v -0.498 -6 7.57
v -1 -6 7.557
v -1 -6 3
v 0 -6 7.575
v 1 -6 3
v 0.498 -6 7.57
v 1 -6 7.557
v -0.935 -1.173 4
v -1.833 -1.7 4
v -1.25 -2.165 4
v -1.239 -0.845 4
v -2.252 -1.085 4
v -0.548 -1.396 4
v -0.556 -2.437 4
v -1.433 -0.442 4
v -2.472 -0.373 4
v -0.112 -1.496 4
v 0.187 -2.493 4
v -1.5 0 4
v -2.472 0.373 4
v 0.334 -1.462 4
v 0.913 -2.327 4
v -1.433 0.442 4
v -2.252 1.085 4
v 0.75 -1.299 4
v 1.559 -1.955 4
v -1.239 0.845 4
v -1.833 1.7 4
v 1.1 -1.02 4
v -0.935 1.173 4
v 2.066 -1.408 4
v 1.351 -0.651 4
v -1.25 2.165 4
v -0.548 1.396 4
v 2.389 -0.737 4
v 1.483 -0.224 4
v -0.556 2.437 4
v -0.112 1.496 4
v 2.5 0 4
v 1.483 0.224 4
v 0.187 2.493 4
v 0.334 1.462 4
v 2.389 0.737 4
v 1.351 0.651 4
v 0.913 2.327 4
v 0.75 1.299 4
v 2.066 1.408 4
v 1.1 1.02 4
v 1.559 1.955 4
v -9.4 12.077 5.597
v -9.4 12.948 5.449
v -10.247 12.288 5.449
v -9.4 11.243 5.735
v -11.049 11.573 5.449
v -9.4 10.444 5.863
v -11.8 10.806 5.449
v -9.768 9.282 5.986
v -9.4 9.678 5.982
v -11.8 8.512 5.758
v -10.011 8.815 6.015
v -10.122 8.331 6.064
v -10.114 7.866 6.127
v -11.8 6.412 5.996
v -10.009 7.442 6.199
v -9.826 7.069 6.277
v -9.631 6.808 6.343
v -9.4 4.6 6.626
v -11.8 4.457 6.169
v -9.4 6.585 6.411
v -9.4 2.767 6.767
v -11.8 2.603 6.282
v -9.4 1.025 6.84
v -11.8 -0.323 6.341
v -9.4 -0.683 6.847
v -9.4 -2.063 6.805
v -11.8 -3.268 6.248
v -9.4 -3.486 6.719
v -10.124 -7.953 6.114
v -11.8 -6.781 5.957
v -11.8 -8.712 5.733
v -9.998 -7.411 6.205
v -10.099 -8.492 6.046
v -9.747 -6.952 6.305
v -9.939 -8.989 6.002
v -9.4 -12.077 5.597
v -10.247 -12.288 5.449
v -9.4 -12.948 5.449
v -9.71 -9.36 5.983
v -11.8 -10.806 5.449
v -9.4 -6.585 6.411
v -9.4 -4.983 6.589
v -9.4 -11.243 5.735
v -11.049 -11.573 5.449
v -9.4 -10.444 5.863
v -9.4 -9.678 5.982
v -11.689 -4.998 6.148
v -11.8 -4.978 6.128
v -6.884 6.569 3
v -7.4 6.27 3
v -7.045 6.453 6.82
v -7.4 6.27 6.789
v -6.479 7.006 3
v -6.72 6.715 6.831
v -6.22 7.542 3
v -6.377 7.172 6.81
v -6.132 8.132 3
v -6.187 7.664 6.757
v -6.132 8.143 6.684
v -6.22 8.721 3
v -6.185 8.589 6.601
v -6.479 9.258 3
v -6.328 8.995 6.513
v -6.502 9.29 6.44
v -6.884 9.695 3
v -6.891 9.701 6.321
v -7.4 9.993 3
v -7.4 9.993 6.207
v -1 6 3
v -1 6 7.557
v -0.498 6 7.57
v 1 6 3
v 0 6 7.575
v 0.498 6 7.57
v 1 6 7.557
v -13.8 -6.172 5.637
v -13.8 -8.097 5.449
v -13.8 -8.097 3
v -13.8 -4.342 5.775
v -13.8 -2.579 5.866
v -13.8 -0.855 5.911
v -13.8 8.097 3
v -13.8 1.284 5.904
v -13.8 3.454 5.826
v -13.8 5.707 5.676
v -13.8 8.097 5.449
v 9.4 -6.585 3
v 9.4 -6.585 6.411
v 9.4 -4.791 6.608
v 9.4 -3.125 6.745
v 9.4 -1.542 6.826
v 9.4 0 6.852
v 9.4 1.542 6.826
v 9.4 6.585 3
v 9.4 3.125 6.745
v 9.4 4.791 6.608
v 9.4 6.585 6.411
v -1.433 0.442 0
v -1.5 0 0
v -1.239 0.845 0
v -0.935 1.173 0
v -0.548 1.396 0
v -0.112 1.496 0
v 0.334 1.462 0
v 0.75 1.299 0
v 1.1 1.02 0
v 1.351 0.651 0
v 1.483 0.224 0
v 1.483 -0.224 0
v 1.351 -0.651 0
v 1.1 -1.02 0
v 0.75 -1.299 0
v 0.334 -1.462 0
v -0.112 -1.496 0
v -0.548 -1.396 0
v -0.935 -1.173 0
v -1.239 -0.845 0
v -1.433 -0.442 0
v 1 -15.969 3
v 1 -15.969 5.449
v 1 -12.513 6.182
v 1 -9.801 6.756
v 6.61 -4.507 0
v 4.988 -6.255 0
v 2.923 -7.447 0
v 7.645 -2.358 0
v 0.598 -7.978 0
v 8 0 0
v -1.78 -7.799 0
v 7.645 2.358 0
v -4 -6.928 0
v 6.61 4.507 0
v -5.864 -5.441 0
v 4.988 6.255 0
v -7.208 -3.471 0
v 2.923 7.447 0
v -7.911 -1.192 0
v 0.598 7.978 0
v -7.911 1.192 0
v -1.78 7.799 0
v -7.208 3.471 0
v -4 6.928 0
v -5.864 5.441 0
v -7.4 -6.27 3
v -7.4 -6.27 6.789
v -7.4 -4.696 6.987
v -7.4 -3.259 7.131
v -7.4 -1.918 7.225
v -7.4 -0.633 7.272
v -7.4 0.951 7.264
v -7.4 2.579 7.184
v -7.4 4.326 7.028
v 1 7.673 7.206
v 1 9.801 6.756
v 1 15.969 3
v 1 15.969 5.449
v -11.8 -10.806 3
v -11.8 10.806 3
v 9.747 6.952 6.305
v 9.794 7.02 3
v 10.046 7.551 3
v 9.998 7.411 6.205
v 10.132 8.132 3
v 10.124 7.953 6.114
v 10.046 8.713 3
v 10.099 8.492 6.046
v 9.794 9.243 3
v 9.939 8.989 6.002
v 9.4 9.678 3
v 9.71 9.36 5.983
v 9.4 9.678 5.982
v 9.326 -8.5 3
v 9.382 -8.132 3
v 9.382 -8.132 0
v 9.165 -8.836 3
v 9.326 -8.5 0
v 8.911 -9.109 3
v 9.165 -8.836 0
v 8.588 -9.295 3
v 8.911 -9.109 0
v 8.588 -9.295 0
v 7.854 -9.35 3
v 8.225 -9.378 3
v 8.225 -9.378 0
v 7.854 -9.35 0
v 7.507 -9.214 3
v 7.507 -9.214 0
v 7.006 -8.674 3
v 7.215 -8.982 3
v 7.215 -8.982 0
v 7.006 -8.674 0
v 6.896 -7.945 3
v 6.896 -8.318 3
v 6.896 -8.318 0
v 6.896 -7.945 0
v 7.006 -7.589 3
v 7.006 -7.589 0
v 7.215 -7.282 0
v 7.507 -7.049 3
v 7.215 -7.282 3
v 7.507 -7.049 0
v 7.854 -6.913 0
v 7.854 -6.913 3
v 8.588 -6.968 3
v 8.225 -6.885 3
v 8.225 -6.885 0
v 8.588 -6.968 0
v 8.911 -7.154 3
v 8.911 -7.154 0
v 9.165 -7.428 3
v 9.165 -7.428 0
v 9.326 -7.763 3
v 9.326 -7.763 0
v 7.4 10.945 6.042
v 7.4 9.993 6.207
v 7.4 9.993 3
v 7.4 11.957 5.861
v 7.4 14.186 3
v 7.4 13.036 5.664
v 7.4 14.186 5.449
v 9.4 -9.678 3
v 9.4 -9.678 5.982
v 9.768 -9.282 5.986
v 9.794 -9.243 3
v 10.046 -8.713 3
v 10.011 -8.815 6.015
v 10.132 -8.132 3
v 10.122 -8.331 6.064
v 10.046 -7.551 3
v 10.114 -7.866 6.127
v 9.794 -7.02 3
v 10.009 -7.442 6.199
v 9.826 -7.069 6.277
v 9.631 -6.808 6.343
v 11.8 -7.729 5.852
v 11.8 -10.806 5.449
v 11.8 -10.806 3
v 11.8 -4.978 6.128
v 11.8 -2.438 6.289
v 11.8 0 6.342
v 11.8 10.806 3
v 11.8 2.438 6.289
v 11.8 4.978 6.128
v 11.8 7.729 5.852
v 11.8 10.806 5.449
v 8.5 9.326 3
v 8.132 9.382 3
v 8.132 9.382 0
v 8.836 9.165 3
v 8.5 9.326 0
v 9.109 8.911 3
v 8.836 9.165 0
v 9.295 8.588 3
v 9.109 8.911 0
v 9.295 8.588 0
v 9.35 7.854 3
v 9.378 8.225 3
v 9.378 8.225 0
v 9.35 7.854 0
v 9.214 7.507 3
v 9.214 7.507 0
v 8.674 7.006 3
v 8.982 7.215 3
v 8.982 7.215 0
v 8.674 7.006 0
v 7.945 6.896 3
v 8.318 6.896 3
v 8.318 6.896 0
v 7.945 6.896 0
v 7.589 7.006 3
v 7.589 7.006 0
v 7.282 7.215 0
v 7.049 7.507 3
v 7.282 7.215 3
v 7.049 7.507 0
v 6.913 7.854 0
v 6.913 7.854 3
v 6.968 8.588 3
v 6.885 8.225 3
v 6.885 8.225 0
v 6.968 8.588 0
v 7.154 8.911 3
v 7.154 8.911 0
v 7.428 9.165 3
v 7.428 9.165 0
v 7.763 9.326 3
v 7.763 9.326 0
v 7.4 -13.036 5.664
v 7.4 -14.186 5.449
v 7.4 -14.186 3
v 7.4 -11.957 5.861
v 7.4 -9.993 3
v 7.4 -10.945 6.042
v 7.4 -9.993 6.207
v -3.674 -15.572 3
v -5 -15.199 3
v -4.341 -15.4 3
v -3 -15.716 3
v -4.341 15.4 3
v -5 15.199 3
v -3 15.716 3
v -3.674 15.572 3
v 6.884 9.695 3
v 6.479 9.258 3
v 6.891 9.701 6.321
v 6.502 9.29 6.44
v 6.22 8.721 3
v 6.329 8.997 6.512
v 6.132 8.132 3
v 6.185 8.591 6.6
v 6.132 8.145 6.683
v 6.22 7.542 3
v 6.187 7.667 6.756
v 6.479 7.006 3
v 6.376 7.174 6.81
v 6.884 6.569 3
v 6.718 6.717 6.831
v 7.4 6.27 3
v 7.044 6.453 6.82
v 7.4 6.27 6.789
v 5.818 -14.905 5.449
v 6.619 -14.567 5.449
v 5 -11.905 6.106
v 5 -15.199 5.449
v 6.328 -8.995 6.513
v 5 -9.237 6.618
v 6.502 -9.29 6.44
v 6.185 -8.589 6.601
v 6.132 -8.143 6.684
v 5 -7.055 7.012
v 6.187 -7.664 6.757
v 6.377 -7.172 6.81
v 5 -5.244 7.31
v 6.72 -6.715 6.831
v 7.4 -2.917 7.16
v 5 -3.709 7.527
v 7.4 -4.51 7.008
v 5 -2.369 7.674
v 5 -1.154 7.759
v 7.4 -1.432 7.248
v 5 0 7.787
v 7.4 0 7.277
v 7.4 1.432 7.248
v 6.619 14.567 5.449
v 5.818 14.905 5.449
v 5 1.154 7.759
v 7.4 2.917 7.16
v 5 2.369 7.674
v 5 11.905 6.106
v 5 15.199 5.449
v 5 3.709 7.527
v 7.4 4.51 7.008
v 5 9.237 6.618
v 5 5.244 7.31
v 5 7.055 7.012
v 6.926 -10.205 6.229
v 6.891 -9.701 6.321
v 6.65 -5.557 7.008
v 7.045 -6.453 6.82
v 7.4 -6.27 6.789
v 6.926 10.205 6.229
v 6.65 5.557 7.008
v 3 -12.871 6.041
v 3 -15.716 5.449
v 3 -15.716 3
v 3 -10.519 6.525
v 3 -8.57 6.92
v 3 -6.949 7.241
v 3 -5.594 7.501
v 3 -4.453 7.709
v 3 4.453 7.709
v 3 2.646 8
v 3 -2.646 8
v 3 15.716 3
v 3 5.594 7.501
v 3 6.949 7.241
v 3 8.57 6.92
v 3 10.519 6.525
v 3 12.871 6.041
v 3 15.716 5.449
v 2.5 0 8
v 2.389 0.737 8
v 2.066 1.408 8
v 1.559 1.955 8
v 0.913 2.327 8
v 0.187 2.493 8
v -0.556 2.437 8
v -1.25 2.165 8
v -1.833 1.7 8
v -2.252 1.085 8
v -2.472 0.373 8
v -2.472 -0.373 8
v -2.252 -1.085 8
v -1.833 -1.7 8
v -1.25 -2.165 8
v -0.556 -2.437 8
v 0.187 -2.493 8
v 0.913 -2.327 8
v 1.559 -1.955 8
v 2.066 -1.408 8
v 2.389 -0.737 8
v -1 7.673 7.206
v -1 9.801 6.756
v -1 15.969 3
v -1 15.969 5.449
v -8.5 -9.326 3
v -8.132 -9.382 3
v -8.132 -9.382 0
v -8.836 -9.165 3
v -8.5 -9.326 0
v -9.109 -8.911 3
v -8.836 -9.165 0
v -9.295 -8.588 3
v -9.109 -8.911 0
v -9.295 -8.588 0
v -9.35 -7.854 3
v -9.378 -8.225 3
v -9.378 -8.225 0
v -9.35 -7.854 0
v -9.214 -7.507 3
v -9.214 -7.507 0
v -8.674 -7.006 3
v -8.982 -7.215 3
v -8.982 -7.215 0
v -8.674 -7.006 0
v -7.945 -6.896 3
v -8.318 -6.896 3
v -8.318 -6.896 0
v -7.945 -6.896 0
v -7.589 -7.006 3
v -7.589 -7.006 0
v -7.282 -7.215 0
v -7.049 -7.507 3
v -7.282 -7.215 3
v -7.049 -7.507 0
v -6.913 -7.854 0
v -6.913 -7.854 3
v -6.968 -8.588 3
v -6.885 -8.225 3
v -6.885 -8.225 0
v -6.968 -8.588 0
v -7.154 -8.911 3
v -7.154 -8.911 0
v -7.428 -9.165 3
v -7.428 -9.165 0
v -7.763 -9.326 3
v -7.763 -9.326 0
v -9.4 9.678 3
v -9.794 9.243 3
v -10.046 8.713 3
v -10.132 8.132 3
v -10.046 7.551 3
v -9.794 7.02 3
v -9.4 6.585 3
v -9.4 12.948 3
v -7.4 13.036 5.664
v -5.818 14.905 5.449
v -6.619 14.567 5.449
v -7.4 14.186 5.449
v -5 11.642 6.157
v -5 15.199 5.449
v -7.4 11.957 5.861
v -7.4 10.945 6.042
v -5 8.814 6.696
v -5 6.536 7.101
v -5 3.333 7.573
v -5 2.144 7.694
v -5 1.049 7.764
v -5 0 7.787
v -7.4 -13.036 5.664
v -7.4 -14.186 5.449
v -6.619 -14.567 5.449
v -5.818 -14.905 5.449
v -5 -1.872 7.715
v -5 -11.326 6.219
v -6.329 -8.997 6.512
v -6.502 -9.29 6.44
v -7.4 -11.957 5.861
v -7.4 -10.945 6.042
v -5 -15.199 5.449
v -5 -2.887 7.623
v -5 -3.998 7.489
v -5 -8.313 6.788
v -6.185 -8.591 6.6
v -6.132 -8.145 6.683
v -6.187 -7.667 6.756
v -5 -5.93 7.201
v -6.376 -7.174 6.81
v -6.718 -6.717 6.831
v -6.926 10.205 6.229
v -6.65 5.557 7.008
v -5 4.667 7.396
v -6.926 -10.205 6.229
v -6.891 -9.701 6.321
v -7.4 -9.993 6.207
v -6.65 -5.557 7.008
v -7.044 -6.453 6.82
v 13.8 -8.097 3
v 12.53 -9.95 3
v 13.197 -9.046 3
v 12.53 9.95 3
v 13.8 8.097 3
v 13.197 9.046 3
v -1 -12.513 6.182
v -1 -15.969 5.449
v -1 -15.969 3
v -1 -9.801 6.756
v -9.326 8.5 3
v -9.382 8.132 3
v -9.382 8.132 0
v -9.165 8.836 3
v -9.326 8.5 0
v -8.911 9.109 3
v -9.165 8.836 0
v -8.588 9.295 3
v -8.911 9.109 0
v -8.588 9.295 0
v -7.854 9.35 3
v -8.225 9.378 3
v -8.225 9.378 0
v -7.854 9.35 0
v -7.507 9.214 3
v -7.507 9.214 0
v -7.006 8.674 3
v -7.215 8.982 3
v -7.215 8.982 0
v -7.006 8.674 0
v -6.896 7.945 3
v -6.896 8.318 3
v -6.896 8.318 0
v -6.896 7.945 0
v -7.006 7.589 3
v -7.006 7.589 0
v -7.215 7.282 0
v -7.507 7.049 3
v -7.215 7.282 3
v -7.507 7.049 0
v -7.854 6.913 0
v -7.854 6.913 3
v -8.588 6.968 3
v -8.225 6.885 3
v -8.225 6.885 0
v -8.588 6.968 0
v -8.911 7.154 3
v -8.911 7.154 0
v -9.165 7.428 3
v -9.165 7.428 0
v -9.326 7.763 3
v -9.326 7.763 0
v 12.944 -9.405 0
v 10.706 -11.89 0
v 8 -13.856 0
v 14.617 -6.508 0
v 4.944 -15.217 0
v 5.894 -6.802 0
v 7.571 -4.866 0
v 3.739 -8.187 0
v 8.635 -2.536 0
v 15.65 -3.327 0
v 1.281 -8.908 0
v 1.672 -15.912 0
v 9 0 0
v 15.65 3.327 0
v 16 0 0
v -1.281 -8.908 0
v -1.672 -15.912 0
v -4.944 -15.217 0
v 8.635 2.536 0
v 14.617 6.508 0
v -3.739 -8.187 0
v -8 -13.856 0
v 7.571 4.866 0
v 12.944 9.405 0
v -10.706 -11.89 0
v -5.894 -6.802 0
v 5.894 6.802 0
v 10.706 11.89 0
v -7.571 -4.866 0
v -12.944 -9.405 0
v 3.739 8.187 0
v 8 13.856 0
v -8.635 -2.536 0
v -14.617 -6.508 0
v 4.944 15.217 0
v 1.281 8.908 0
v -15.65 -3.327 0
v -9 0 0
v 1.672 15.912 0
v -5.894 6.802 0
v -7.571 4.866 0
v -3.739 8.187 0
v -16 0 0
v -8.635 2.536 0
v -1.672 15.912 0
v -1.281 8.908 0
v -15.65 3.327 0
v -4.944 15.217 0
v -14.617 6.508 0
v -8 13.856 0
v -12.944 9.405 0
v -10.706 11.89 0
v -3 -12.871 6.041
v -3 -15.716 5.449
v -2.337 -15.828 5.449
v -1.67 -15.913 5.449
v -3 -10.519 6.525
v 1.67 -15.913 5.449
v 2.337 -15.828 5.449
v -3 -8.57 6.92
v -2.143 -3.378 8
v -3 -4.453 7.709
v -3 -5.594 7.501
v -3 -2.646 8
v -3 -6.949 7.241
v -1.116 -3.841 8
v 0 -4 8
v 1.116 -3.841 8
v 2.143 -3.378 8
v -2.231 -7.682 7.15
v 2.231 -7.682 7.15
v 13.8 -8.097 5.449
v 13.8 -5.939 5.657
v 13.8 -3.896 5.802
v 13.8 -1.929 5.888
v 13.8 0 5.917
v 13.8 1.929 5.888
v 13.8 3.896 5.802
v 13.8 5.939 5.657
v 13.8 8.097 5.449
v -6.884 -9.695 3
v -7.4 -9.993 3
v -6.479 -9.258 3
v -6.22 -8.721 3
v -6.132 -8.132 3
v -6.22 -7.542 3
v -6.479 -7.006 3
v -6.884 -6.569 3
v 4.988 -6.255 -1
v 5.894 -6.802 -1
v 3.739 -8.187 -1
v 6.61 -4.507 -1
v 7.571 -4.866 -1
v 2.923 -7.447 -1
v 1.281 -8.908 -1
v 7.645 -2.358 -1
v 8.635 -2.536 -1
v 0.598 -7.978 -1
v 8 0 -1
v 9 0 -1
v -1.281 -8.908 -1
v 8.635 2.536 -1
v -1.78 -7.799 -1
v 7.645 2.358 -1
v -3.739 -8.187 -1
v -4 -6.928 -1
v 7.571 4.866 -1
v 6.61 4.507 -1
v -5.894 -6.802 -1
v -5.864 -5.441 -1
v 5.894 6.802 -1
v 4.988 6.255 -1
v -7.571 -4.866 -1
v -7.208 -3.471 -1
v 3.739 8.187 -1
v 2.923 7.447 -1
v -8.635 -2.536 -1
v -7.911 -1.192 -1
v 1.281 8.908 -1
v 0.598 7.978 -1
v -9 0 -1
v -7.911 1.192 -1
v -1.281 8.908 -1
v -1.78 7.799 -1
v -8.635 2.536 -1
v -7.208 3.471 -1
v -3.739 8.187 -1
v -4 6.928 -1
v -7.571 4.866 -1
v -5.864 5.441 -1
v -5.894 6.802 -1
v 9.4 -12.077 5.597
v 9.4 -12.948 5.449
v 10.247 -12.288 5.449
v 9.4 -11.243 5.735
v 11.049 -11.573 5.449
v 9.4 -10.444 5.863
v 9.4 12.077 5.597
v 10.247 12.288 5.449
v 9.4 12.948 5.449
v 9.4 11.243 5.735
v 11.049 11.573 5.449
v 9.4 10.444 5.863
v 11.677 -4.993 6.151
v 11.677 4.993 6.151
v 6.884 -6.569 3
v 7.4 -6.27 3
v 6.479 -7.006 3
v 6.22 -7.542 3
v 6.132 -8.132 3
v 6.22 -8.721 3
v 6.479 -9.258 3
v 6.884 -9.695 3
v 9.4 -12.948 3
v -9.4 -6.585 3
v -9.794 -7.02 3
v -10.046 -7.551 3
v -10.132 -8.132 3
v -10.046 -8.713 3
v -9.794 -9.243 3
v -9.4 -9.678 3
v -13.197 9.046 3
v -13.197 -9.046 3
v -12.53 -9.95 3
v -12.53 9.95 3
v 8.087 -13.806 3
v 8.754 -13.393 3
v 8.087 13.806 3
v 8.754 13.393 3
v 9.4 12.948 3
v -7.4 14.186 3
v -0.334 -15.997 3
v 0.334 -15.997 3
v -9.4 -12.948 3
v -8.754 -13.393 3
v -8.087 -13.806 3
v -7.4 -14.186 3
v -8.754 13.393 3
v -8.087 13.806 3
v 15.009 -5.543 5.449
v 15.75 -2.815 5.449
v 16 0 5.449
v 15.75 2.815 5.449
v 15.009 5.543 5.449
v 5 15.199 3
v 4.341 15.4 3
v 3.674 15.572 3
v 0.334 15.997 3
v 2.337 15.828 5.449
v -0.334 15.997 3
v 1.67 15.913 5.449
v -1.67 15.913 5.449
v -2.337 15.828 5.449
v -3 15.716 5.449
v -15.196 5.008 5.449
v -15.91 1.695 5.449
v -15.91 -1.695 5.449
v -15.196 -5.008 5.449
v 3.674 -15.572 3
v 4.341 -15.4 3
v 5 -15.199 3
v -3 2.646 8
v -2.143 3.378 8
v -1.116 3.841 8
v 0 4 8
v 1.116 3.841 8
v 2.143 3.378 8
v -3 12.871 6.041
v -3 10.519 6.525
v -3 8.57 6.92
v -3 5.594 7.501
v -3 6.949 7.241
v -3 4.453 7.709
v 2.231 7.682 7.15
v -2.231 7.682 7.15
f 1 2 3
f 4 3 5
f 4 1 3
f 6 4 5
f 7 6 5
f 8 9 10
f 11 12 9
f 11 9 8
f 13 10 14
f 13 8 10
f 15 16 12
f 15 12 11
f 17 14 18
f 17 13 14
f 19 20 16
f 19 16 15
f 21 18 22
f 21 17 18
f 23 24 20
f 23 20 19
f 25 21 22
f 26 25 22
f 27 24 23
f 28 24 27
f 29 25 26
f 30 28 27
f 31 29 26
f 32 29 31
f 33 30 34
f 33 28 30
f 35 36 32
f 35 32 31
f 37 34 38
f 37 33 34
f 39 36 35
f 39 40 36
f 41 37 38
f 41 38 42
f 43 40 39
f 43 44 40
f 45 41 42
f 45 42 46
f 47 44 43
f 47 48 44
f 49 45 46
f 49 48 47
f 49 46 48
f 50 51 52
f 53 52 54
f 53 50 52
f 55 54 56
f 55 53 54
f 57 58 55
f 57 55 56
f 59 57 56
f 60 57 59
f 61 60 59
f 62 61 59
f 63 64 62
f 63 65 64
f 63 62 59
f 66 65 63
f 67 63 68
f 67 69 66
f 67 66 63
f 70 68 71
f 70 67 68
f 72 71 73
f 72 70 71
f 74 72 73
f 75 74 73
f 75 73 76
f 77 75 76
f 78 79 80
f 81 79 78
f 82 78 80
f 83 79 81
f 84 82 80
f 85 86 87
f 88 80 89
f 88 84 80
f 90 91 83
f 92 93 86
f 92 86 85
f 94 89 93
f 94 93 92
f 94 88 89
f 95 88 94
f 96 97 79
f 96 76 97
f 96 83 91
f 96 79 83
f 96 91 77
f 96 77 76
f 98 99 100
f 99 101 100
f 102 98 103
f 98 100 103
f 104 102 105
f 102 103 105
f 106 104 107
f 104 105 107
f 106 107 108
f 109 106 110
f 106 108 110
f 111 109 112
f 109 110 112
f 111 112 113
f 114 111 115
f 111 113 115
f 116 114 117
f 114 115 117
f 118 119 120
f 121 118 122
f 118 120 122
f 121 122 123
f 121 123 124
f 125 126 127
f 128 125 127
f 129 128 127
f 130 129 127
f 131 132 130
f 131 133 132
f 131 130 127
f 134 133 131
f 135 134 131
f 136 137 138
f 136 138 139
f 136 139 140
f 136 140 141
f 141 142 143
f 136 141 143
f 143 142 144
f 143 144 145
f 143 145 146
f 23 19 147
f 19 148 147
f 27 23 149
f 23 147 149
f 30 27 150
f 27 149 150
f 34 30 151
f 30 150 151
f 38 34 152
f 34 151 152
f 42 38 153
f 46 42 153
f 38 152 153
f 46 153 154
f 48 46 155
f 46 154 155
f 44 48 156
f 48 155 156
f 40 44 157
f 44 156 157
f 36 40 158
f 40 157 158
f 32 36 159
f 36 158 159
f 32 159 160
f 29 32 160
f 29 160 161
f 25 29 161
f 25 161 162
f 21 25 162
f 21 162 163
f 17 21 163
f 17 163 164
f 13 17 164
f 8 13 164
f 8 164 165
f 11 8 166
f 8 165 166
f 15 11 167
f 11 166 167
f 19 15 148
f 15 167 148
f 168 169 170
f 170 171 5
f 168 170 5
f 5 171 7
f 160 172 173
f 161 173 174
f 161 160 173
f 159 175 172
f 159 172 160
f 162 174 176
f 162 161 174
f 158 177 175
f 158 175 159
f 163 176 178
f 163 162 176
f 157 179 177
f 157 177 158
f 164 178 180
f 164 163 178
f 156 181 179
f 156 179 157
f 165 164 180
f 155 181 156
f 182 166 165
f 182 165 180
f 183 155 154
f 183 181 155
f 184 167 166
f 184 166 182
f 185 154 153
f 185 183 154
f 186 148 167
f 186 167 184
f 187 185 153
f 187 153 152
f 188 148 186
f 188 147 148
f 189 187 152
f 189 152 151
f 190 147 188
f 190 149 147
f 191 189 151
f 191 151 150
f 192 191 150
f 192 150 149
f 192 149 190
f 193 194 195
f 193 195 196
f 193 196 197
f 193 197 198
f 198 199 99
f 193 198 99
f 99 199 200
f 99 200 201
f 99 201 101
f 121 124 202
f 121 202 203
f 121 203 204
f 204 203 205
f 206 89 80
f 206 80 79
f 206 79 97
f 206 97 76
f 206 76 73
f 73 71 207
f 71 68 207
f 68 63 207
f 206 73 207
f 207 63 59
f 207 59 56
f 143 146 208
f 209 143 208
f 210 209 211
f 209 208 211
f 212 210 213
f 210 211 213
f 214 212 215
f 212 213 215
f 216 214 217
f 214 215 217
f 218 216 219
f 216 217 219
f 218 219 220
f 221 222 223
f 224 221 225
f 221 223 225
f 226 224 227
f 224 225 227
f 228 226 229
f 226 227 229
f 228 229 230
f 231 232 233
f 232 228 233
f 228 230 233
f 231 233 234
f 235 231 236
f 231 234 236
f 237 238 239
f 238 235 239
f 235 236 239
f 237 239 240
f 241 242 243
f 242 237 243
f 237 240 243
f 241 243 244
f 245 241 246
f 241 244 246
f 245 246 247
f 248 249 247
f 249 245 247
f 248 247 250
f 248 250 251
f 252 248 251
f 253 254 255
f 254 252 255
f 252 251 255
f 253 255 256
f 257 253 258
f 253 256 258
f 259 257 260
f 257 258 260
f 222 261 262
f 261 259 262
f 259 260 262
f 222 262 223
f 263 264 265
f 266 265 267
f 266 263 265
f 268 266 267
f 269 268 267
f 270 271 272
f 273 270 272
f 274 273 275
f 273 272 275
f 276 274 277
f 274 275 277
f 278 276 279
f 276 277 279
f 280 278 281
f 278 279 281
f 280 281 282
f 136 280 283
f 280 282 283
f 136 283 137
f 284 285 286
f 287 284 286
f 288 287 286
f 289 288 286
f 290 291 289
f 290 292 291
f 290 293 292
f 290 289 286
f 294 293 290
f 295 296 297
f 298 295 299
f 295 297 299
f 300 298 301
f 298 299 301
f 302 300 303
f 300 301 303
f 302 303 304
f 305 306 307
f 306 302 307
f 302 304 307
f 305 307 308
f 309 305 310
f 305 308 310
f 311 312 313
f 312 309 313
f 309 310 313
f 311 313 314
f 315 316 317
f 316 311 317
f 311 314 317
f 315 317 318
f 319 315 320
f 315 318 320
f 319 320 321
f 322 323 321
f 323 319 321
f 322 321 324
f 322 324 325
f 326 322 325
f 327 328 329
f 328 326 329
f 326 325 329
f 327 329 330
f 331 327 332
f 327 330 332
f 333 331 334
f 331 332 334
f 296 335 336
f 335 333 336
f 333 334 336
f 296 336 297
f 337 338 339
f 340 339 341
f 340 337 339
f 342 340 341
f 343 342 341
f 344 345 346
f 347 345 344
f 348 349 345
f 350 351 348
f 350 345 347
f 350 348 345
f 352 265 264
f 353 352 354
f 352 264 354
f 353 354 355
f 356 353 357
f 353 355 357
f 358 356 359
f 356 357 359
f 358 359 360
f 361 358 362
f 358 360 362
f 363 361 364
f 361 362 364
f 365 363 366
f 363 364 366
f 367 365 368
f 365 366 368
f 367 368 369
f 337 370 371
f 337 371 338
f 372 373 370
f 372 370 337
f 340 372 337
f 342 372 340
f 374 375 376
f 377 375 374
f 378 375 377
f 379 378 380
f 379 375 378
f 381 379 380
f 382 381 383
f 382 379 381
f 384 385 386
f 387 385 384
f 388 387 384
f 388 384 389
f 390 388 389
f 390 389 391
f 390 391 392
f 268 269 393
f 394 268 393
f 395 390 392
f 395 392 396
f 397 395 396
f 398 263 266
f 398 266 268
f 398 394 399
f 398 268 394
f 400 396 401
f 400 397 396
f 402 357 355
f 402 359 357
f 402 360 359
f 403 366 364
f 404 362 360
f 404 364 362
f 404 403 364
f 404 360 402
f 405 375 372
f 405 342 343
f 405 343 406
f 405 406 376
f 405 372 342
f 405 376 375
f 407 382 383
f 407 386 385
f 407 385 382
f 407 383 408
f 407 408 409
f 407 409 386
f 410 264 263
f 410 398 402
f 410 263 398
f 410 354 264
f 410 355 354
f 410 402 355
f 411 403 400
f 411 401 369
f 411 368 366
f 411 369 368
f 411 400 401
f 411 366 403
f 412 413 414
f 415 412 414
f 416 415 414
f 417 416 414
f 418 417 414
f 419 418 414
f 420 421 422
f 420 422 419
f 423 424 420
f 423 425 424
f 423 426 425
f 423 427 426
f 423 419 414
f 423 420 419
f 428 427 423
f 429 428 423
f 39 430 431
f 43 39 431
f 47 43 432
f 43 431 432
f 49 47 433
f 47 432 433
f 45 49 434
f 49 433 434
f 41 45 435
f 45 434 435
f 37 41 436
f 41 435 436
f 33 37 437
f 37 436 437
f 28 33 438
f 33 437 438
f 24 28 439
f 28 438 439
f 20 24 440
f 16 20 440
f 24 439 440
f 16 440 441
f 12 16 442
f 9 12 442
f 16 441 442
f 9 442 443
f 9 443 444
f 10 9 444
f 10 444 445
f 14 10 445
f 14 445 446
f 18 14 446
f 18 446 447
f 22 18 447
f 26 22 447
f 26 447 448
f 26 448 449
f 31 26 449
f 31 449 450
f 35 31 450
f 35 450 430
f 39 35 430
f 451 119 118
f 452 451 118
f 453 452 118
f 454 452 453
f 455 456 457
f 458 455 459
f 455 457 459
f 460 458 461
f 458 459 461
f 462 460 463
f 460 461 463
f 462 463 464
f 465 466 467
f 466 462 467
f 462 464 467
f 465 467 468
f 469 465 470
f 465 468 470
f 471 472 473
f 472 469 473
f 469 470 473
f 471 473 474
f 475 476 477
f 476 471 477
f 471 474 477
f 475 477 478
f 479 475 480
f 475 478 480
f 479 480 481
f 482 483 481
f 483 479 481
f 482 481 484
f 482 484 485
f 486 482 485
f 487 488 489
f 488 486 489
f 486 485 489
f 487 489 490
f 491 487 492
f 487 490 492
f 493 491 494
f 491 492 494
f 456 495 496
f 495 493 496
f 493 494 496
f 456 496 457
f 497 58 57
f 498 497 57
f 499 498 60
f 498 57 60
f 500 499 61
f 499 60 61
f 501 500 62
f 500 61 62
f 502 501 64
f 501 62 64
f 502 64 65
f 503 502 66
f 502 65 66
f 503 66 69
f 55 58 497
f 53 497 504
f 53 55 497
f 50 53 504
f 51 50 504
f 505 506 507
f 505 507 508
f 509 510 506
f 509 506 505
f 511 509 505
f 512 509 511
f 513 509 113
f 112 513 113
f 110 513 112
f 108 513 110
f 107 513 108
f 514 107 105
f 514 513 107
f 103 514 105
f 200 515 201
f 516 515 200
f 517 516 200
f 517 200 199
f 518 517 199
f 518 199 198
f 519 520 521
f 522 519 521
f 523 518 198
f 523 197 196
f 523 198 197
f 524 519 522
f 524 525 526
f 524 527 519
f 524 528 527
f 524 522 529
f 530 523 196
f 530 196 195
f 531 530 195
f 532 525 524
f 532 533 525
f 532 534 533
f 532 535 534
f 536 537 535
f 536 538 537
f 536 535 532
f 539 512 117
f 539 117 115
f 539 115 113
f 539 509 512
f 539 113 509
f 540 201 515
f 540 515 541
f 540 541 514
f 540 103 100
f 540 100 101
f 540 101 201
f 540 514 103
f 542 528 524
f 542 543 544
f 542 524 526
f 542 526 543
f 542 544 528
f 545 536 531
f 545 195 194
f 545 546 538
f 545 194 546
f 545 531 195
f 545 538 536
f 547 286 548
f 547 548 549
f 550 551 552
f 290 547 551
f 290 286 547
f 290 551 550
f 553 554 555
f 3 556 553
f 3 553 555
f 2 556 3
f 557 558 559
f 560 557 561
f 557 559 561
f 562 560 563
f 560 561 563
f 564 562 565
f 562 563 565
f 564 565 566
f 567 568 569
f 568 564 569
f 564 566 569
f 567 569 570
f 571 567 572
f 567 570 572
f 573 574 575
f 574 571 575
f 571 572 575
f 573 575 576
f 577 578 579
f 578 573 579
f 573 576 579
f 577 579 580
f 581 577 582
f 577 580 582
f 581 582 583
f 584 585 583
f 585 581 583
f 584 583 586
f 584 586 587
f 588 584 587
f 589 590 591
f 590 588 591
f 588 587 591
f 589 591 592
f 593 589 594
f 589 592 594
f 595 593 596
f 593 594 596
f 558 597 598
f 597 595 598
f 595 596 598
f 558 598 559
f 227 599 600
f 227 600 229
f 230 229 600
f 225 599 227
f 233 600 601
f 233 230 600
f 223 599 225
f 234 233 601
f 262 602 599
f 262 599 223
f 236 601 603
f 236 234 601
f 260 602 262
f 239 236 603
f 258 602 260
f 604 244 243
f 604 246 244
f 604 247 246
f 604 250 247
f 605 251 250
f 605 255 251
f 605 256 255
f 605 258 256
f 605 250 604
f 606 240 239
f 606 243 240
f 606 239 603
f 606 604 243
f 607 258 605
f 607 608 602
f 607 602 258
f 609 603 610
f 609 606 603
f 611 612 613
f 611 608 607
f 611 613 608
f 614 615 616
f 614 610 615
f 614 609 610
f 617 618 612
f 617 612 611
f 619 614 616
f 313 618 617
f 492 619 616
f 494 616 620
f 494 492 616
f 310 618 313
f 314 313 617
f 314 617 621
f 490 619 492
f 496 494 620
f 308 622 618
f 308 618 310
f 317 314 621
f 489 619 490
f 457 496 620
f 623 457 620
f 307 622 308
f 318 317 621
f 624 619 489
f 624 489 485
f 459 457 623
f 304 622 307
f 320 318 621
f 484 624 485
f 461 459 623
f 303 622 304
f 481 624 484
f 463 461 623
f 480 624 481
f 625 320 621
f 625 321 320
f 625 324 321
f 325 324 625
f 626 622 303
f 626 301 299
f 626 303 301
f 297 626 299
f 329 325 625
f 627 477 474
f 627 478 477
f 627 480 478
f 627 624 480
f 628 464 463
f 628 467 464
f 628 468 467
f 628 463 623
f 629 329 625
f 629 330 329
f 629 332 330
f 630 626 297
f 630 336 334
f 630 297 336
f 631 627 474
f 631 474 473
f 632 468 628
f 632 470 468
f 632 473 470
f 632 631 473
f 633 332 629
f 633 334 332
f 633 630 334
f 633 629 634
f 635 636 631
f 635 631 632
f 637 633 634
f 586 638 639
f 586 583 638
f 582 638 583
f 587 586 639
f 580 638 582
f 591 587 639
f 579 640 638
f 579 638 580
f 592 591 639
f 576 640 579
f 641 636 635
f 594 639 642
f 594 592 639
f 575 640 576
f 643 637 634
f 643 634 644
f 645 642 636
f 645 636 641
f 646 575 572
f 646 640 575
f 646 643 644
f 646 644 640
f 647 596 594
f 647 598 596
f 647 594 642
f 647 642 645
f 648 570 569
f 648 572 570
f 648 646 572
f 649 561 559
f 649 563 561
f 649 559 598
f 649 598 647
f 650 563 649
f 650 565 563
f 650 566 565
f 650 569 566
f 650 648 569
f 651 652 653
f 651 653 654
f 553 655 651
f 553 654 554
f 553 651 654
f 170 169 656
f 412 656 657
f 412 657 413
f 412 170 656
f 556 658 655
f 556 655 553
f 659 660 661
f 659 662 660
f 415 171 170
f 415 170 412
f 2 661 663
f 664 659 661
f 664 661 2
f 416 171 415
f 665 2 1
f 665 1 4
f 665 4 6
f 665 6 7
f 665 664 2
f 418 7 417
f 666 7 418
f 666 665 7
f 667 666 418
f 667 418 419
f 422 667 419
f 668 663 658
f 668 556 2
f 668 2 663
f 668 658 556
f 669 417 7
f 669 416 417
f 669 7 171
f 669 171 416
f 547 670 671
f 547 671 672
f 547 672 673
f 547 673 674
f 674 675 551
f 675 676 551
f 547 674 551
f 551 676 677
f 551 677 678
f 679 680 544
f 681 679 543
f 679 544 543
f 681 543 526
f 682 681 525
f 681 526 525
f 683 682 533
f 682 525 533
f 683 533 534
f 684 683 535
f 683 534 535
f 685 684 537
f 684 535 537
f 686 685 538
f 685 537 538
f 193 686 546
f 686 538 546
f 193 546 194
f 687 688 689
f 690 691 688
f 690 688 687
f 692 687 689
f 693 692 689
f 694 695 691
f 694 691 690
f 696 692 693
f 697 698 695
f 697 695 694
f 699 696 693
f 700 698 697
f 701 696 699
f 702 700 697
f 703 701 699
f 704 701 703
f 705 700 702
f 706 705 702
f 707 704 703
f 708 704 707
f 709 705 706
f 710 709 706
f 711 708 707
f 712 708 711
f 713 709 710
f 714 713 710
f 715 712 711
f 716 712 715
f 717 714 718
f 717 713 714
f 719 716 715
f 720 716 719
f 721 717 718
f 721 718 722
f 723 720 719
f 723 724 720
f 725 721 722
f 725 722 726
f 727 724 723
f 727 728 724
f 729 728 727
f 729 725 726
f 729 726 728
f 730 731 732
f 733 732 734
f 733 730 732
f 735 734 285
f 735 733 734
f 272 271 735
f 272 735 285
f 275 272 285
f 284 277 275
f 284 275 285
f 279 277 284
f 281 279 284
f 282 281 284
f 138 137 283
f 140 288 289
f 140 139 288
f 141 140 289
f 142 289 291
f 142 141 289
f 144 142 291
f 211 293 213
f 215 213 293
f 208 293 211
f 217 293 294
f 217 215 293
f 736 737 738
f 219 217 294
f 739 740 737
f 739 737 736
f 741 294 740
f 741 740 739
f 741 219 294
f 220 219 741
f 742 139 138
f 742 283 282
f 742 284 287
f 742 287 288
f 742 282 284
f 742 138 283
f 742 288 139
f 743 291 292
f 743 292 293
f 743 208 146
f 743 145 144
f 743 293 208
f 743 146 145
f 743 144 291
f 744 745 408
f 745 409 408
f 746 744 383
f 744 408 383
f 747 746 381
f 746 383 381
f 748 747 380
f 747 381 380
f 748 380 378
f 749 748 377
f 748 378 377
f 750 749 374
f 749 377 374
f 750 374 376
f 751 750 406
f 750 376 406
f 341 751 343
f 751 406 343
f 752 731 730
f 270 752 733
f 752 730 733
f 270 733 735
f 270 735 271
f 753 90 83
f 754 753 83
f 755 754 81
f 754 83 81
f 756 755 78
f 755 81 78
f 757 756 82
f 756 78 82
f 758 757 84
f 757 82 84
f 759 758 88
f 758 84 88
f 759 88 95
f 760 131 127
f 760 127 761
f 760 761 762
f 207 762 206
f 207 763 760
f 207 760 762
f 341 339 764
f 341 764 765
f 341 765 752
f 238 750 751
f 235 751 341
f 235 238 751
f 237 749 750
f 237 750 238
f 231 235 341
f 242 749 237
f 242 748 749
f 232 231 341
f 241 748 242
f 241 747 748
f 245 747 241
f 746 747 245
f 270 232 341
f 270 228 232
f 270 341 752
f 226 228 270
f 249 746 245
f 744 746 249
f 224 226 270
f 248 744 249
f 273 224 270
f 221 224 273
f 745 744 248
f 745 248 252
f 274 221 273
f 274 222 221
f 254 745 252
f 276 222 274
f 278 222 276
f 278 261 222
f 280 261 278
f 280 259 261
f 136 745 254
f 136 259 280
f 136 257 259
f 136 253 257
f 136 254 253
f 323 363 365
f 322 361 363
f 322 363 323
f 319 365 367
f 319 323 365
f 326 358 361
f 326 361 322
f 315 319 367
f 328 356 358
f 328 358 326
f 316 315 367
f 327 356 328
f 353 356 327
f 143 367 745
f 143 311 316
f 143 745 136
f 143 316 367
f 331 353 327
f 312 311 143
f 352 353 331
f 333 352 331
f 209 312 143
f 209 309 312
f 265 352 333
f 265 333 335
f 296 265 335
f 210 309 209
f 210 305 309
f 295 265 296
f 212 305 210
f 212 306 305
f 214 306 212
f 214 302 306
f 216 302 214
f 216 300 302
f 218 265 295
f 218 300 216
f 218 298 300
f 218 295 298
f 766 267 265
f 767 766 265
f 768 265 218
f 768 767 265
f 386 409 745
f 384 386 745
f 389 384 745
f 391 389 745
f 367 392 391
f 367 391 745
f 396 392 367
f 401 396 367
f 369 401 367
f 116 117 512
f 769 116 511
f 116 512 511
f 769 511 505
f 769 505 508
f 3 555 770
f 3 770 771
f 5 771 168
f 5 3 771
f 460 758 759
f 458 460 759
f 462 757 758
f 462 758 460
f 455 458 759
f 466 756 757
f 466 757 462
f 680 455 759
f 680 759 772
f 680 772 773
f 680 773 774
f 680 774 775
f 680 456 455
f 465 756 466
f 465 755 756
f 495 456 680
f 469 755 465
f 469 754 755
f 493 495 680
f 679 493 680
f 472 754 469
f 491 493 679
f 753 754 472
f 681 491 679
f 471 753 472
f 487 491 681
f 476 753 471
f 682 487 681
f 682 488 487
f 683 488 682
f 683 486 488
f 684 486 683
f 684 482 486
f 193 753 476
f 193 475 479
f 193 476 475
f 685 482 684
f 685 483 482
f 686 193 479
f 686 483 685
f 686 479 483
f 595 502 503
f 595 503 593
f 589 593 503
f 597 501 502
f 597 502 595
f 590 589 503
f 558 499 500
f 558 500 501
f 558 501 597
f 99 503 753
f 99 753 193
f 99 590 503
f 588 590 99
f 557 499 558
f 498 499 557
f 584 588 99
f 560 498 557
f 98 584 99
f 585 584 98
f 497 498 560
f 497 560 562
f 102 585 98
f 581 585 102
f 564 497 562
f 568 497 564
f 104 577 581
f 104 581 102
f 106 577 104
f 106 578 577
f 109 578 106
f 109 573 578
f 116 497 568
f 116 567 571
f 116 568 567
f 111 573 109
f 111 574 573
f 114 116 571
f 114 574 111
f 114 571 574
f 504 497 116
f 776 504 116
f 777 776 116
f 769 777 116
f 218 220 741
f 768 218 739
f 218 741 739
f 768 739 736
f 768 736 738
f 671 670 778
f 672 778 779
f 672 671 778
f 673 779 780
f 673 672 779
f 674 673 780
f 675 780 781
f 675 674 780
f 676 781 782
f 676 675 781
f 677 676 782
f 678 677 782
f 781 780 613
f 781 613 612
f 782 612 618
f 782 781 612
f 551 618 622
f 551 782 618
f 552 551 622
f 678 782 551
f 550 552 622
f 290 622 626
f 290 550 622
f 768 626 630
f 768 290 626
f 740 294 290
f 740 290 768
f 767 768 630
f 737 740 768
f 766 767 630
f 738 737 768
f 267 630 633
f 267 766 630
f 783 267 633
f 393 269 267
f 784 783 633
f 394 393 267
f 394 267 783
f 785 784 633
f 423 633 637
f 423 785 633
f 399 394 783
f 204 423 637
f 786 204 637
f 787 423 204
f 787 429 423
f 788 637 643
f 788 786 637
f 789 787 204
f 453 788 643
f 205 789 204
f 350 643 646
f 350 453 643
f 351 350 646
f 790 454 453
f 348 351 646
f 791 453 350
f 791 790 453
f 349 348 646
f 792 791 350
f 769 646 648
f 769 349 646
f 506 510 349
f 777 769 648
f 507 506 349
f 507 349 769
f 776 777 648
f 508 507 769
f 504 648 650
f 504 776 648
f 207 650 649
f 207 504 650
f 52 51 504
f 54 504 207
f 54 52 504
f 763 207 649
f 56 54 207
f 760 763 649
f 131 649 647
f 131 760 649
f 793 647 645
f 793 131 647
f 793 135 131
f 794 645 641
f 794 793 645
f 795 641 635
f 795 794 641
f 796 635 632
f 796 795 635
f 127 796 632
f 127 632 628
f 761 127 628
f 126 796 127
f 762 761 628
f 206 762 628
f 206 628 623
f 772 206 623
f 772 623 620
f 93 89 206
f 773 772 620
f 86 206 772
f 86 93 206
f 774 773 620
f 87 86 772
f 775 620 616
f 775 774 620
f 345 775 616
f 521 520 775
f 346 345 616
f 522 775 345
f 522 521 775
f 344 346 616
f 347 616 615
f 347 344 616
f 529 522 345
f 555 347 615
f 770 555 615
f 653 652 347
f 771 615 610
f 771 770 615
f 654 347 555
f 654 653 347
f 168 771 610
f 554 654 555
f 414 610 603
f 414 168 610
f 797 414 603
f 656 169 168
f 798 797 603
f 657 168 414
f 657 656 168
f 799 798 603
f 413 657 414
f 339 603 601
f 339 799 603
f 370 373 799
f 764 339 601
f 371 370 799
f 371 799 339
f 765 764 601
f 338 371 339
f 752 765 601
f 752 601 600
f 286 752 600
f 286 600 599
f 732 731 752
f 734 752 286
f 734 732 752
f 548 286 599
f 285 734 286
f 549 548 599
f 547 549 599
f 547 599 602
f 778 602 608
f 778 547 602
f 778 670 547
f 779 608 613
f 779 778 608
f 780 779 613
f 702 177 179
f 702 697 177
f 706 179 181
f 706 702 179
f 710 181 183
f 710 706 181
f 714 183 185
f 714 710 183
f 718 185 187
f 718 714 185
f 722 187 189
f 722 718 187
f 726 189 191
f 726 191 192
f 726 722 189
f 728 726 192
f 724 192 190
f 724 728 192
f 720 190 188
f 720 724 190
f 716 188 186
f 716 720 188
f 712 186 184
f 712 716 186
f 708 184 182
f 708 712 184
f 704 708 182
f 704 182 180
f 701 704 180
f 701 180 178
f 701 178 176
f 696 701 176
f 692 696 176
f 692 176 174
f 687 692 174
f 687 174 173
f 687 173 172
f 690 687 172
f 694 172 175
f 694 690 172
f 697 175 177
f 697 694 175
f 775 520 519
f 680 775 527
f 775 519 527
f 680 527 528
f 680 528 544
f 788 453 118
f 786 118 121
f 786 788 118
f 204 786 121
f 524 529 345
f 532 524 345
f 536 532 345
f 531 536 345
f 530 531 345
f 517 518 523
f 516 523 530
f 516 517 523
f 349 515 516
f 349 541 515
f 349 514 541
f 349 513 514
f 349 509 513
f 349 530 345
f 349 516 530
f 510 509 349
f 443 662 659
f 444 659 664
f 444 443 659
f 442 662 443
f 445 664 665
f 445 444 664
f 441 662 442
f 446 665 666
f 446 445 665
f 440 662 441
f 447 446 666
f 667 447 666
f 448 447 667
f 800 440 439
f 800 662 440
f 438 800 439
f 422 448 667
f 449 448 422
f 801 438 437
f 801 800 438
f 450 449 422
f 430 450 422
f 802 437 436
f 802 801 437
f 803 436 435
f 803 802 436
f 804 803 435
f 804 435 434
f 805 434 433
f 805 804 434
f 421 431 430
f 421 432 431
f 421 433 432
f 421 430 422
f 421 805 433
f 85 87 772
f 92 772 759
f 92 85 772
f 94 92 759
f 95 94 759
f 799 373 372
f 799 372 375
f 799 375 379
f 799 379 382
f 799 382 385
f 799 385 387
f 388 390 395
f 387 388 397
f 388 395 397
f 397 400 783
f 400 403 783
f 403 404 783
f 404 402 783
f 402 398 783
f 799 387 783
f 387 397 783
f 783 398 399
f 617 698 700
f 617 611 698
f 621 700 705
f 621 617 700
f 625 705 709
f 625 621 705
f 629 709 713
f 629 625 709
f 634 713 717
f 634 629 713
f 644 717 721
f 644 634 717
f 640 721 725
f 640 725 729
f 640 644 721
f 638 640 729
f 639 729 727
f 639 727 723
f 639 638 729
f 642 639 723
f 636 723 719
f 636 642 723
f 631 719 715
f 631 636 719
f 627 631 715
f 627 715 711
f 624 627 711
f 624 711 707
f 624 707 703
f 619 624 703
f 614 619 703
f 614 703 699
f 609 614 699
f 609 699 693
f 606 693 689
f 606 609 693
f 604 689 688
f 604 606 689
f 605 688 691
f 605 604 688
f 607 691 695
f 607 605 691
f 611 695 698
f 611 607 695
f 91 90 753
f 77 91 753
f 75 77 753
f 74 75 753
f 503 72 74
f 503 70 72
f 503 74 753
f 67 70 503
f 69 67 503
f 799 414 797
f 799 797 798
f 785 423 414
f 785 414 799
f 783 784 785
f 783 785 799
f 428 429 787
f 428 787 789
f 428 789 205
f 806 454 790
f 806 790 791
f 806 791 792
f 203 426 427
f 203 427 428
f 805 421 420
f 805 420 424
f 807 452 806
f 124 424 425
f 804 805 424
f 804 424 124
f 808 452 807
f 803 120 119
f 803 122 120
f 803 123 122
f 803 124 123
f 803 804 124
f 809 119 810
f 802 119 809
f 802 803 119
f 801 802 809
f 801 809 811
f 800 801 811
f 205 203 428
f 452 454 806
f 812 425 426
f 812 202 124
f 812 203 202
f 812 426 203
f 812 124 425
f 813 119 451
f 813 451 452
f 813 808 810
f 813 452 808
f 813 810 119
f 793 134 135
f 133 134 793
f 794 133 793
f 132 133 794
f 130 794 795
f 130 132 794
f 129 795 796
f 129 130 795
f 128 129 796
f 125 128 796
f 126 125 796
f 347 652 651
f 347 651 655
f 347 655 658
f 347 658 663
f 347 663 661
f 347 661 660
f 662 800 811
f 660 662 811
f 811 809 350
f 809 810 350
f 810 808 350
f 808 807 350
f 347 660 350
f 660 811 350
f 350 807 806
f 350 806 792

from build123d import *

# Parameters (mm, degrees)
F3_D            = 3
F3_CBORE_D      = 5
F3_CBORE_DEPTH  = 4
F4_D            = 2.5
F4_CBORE_D      = 4
F4_CBORE_DEPTH  = 5
F4_COPIES_COUNT = 4
F5_W            = 2
F5_H            = 35
F5_H_2          = 11.5
F6_DEPTH        = 5


# Not quite as in the source:
# - a pattern or mirror of a feature is missing from the dataset's text; its kind, count and spacing are read off the source's solid


with BuildPart() as f1:
    # F0 (on Front) → F1 (revolve)
    with BuildSketch(Plane.XZ):
        Polygon((0, 8), (0, 0), (8, 0), (8, -1), (9, -1), (9, 0), (16, 0), (16, 5.44932126), (4, 8), align=None)
    revolve(axis=Axis((0, 0, 4), (0, 0, 1)))

    # F3 (through all)
    with Locations(Plane.XY.offset(8)):
        with Locations((0, 0)):
            CounterBoreHole(F3_D / 2, F3_CBORE_D / 2, F3_CBORE_DEPTH)

    # F4 (through all)
    with Locations(Plane.XY.offset(8)):
        with Locations((-8.1317279836, 8.1317279836)):
            f4 = CounterBoreHole(F4_D / 2, F4_CBORE_D / 2, F4_CBORE_DEPTH)

    # F4_copies: F4 ×4 about axis
    f4_copies_axis = Axis((0, 0, 0), (0, 0, 1))
    for i in range(1, F4_COPIES_COUNT):
        add(f4.rotate(f4_copies_axis, i * 360 / F4_COPIES_COUNT), mode=Mode.SUBTRACT)

    # F5 (on face) → F6 (cut)
    with BuildSketch(Plane.XY.offset(8)):
        with Locations((-4, 0)):
            Rectangle(F5_W, F5_H)
        with Locations((-8.4, 0)):
            Rectangle(F5_W, F5_H)
        with Locations((-12.8, 0)):
            Rectangle(F5_W, F5_H)
        with Locations((4, 0)):
            Rectangle(F5_W, F5_H)
        with Locations((8.4, 0)):
            Rectangle(F5_W, F5_H)
        with Locations((12.8, 0)):
            Rectangle(F5_W, F5_H)
        with Locations((0, 11.75)):
            Rectangle(F5_W, F5_H_2)
        with Locations((0, -11.75)):
            Rectangle(F5_W, F5_H_2)
    extrude(amount=-F6_DEPTH, mode=Mode.SUBTRACT)


solid = f1.part
